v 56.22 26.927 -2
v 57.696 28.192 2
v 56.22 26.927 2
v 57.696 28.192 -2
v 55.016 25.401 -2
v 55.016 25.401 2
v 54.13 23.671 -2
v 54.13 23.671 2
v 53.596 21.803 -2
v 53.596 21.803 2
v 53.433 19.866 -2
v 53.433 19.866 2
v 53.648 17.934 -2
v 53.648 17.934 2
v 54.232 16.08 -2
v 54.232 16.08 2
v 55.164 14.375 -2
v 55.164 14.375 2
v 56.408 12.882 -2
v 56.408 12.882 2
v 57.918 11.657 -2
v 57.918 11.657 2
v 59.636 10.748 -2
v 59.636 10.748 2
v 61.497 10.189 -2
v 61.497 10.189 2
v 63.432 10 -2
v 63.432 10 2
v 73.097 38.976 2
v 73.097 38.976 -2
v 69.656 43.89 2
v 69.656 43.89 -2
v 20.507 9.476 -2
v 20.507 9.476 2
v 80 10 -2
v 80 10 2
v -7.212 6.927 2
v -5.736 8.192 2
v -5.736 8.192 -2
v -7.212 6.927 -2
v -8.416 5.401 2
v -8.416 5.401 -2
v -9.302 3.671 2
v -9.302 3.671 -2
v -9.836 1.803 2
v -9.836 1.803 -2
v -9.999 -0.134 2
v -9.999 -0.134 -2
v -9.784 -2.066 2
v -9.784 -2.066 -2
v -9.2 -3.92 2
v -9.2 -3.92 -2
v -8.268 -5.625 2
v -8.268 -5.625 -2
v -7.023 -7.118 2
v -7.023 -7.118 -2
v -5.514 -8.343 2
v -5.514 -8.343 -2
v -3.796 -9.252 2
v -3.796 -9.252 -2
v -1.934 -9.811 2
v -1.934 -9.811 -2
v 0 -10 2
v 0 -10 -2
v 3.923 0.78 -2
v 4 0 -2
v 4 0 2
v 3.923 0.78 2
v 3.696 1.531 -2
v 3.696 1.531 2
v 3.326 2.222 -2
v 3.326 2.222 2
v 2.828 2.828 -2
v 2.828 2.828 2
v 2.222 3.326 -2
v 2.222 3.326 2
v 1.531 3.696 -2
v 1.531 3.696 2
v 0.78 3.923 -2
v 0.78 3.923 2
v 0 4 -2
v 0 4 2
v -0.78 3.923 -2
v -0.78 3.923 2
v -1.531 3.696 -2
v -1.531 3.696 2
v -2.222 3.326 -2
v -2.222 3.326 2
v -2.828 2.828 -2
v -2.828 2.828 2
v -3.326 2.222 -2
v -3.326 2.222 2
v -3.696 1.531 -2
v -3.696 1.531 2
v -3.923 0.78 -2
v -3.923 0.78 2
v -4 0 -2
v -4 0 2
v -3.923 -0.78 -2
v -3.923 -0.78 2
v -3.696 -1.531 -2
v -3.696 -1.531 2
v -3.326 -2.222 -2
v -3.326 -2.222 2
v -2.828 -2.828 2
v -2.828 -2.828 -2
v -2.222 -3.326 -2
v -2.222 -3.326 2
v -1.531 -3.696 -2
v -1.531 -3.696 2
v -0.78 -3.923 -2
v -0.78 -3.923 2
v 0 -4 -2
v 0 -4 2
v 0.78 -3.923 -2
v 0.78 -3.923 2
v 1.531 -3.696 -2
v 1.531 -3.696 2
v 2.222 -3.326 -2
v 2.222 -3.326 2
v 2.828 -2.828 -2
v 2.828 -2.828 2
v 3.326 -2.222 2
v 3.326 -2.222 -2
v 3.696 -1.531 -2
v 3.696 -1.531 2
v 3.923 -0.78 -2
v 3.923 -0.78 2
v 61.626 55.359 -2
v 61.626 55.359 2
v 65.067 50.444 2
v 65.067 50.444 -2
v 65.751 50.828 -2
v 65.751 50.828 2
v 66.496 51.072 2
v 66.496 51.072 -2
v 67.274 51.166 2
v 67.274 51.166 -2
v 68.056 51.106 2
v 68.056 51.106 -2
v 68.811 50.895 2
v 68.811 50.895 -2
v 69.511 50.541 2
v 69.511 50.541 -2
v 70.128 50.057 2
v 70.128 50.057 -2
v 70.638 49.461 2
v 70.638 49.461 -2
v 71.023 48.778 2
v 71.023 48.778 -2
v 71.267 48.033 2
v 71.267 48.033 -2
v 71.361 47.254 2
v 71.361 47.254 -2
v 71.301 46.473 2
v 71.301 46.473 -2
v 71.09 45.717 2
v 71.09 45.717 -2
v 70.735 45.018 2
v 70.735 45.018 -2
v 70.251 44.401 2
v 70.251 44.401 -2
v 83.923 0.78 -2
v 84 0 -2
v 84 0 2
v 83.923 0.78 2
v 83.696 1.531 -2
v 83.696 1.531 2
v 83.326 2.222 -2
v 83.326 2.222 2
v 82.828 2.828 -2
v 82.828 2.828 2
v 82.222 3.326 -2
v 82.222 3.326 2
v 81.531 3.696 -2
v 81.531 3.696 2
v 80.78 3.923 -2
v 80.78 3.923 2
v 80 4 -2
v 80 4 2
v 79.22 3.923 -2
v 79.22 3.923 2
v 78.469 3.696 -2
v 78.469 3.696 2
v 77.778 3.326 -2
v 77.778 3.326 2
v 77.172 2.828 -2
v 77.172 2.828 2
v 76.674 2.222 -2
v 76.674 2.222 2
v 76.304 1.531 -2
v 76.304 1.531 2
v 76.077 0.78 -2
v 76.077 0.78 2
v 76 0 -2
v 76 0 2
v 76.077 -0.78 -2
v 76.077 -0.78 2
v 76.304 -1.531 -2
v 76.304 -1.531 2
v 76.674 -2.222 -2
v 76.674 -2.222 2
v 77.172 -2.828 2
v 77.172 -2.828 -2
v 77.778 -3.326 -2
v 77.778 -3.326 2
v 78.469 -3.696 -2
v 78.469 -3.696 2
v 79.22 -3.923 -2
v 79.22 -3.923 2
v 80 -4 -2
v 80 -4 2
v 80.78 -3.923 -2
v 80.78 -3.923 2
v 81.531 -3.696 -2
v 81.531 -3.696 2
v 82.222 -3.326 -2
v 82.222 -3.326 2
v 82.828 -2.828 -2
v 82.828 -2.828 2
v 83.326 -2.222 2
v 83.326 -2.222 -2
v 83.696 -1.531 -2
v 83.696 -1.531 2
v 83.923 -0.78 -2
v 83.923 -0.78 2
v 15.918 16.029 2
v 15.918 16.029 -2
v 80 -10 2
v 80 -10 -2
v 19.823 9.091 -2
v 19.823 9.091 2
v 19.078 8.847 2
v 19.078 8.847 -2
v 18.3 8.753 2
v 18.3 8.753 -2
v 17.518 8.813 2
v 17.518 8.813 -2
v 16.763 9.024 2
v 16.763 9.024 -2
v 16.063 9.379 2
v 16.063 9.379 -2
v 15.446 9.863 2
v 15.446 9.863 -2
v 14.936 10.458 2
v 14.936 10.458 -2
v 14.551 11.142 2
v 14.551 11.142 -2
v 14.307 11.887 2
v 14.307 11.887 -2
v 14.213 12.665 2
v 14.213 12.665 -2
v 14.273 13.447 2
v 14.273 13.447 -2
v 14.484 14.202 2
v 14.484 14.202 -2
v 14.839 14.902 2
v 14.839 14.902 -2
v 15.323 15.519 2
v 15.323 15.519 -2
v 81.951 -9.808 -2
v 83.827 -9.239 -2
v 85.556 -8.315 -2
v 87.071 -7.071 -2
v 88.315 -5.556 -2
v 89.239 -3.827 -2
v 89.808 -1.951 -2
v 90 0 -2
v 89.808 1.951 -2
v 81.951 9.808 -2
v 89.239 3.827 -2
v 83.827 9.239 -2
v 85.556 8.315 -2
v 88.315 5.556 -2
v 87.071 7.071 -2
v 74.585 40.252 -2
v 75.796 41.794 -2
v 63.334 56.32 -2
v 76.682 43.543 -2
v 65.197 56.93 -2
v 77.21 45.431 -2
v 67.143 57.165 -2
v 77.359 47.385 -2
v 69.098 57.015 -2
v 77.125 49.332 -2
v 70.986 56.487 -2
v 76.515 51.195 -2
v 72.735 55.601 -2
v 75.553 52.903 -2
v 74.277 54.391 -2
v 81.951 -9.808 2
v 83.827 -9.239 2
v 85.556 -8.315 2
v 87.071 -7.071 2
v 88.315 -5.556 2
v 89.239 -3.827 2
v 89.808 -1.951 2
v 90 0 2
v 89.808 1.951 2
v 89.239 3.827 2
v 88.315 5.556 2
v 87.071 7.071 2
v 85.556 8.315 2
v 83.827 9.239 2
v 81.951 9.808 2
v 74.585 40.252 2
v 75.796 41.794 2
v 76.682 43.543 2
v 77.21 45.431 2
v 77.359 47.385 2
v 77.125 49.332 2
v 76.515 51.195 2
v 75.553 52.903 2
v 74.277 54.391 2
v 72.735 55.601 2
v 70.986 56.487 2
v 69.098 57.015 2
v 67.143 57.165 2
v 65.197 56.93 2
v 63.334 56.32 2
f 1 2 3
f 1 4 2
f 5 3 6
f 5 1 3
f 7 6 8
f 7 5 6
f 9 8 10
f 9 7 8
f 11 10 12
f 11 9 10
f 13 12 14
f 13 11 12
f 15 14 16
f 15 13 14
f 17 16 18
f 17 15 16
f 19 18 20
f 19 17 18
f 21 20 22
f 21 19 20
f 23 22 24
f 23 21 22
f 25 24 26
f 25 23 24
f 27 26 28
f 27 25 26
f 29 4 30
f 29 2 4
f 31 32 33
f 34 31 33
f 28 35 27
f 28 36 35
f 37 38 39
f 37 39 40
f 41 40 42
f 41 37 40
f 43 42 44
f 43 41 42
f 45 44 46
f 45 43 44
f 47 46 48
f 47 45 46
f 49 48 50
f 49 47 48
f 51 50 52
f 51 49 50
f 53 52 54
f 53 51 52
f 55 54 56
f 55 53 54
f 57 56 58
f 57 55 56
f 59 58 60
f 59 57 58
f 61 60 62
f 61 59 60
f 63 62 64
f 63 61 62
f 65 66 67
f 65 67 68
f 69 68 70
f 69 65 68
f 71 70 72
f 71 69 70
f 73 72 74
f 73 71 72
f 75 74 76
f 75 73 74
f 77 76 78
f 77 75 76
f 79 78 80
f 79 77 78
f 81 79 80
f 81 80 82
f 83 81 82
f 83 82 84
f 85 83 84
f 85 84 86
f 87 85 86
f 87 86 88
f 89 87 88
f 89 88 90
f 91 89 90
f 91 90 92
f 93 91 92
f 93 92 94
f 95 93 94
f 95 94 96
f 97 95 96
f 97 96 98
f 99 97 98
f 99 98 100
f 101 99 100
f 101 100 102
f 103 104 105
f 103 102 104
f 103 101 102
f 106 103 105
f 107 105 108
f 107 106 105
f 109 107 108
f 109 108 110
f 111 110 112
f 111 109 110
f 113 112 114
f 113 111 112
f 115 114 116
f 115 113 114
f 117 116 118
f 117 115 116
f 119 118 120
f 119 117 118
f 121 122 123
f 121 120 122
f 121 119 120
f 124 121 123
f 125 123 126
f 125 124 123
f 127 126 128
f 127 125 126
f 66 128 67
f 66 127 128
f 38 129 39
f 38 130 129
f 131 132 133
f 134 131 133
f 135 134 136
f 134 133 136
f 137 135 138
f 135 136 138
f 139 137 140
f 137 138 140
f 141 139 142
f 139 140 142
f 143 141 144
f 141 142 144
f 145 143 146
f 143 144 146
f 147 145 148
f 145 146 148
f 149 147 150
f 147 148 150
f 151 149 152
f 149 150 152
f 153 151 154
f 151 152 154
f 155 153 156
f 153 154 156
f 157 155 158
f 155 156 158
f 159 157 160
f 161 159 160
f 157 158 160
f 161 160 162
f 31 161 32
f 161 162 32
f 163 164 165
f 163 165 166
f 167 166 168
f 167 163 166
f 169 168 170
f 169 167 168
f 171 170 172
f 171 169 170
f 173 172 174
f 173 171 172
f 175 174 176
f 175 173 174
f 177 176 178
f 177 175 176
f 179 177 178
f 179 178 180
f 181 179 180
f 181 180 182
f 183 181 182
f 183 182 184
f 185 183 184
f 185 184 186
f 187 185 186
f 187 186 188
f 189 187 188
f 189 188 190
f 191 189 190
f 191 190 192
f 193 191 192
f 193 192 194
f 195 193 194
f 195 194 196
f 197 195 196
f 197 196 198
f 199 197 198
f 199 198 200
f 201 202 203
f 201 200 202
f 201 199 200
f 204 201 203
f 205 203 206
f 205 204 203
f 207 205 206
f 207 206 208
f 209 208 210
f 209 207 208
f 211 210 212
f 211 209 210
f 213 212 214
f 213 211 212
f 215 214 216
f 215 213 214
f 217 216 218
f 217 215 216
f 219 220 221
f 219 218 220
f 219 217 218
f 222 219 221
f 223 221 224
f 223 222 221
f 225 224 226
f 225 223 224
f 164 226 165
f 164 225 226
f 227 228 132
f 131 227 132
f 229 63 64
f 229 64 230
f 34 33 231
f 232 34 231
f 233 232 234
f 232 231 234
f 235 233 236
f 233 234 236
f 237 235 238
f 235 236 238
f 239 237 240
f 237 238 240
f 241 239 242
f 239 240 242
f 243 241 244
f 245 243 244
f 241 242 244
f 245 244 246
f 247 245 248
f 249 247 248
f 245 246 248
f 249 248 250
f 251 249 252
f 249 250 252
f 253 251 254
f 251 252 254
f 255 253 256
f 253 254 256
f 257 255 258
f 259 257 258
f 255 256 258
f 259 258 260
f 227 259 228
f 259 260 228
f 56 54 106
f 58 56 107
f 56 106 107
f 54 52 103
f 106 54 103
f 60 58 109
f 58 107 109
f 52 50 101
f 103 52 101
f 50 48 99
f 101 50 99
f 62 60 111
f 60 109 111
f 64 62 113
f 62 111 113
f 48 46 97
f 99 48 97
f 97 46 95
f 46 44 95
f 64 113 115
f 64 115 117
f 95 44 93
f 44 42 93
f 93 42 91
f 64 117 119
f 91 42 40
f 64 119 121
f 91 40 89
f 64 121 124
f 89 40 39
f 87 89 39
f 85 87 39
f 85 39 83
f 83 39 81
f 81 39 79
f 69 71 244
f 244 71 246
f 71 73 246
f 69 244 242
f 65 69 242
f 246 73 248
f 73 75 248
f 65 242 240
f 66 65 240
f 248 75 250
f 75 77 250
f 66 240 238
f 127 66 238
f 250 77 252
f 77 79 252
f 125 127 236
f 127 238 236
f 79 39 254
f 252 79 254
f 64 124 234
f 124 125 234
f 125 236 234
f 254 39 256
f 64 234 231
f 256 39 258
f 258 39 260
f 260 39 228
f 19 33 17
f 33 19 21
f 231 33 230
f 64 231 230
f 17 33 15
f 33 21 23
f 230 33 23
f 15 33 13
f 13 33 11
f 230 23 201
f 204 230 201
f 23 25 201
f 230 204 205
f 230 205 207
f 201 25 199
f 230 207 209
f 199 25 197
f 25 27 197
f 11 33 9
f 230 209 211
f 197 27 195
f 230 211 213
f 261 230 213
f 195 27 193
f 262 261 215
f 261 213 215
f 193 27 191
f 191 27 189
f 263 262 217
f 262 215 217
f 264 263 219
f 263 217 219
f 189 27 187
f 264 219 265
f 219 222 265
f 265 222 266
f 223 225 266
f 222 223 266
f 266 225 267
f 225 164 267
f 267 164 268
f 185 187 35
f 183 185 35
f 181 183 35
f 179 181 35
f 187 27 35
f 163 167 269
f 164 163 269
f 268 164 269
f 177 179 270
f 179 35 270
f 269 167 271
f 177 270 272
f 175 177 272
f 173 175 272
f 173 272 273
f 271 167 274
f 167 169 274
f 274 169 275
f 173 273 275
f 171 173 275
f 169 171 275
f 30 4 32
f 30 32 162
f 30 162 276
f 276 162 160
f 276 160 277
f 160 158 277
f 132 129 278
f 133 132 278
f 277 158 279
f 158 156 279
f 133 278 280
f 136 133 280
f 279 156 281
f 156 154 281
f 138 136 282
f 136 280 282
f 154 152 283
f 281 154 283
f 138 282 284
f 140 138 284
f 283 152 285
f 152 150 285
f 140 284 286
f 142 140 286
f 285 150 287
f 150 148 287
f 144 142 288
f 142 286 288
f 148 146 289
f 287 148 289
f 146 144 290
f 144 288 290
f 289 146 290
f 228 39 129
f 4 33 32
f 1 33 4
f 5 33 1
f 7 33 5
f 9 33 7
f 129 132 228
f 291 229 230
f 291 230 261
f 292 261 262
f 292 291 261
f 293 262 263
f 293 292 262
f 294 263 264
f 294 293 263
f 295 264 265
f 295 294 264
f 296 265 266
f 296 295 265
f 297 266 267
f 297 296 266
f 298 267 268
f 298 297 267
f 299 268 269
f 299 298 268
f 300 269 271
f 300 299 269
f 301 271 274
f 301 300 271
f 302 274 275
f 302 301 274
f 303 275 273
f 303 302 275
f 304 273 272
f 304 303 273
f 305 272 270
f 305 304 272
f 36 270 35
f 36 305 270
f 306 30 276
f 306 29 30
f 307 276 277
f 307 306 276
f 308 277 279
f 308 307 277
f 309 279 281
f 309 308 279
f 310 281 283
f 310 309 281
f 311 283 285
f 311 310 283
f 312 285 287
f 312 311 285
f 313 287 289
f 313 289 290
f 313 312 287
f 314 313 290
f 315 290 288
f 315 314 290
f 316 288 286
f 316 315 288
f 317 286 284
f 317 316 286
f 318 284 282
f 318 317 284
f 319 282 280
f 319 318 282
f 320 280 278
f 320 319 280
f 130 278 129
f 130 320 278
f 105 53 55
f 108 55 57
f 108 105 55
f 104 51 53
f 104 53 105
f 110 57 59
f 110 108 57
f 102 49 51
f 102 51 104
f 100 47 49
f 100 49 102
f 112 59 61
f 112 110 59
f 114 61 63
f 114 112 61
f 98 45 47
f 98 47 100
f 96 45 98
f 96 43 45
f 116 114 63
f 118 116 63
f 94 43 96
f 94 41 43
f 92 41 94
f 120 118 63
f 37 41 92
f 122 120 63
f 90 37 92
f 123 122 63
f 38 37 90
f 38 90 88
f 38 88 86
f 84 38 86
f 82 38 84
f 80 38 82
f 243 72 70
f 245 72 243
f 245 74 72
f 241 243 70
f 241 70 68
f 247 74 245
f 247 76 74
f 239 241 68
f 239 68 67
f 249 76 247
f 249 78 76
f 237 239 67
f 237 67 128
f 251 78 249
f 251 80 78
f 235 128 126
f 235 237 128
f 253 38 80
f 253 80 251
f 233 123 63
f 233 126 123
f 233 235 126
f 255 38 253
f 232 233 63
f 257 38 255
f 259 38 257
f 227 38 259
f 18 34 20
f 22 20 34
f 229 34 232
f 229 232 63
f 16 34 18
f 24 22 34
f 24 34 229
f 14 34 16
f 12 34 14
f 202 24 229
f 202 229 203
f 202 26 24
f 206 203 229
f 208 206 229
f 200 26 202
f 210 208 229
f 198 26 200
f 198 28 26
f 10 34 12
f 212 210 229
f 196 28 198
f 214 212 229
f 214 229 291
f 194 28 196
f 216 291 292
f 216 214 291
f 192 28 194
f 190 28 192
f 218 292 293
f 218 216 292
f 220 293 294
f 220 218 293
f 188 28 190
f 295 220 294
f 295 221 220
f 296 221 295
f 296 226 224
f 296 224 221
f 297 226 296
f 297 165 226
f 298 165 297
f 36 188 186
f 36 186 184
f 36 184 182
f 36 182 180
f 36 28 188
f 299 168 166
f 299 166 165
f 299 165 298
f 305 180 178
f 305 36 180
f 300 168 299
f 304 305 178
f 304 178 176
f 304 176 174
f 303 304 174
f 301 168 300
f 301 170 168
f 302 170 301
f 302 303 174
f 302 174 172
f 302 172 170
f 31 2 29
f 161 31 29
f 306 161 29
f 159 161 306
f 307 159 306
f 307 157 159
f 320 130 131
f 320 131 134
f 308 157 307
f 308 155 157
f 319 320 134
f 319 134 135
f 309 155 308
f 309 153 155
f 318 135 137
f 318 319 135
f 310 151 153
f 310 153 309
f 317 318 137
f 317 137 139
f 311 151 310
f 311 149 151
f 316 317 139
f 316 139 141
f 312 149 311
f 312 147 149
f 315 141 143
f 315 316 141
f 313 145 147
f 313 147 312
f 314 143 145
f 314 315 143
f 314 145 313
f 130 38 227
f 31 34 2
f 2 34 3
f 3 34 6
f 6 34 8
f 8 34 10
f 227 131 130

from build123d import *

# Parameters (mm, degrees)
BOSS_EXTRUDE1_DEPTH     = 2
CUT_EXTRUDE1_DEPTH      = 4
CUT_EXTRUDE1_DEPTH_BACK = 107.639946795
SKETCH2_R               = 4
FILLET1_R               = 10


with BuildPart() as part:
    # Sketch1 → Boss-Extrude1 (new, symmetric)
    with BuildSketch(Plane.XY):
        with BuildLine():
            Line((61.625847103, 55.358628577), (-5.735764364, 8.191520443))
            ThreePointArc((-5.735764364, 8.191520443), (-3.007057995, 9.537169507), (0, 10))
            Line((0, 10), (31.715948024, 10))
            Line((31.715948024, 10), (73.09737583, 38.975587692))
            ThreePointArc((73.09737583, 38.975587692), (75.553131909, 52.902872498), (61.625847103, 55.358628577))
        make_face()
        with BuildLine():
            ThreePointArc((0, 10), (-3.007057995, 9.537169507), (-5.735764364, 8.191520443))
            ThreePointArc((-5.735764364, 8.191520443), (-9.537169507, -3.007057995), (0, -10))
            ThreePointArc((0, -10), (3.007057995, -9.537169507), (5.735764364, -8.191520443))
            Line((5.735764364, -8.191520443), (31.715948024, 10))
            Line((31.715948024, 10), (0, 10))
        make_face()
        with BuildLine():
            ThreePointArc((5.735764364, -8.191520443), (3.007057995, -9.537169507), (0, -10))
            Line((0, -10), (80, -10))
            ThreePointArc((80, -10), (90, 0), (80, 10))
            Line((80, 10), (31.715948024, 10))
            Line((31.715948024, 10), (5.735764364, -8.191520443))
        make_face()
    extrude(amount=BOSS_EXTRUDE1_DEPTH, both=True)

    # Sketch2 → Cut-Extrude1 (cut, two sides: drawn at the far end of the back side and taken through both)
    with BuildSketch(Plane.XY.offset(-CUT_EXTRUDE1_DEPTH_BACK)):
        Circle(SKETCH2_R)
        with Locations((80, 0)):
            Circle(SKETCH2_R)
        with BuildLine():
            Line((69.655917211, 43.890499957), (20.506794554, 9.475913776))
            ThreePointArc((20.506794554, 9.475913776), (14.935880632, 10.458216208), (15.918183063, 16.029130131))
            Line((15.918183063, 16.029130131), (65.067305721, 50.443716312))
            ThreePointArc((65.067305721, 50.443716312), (70.638219643, 49.46141388), (69.655917211, 43.890499957))
        make_face()
    extrude(amount=CUT_EXTRUDE1_DEPTH + CUT_EXTRUDE1_DEPTH_BACK, mode=Mode.SUBTRACT)

    # Fillet1
    fillet1_edges = [part.edges().sort_by_distance(p)[0] for p in [
        (31.715948024, 10, 0),
    ]]
    fillet(fillet1_edges, radius=FILLET1_R)


solid = part.part
